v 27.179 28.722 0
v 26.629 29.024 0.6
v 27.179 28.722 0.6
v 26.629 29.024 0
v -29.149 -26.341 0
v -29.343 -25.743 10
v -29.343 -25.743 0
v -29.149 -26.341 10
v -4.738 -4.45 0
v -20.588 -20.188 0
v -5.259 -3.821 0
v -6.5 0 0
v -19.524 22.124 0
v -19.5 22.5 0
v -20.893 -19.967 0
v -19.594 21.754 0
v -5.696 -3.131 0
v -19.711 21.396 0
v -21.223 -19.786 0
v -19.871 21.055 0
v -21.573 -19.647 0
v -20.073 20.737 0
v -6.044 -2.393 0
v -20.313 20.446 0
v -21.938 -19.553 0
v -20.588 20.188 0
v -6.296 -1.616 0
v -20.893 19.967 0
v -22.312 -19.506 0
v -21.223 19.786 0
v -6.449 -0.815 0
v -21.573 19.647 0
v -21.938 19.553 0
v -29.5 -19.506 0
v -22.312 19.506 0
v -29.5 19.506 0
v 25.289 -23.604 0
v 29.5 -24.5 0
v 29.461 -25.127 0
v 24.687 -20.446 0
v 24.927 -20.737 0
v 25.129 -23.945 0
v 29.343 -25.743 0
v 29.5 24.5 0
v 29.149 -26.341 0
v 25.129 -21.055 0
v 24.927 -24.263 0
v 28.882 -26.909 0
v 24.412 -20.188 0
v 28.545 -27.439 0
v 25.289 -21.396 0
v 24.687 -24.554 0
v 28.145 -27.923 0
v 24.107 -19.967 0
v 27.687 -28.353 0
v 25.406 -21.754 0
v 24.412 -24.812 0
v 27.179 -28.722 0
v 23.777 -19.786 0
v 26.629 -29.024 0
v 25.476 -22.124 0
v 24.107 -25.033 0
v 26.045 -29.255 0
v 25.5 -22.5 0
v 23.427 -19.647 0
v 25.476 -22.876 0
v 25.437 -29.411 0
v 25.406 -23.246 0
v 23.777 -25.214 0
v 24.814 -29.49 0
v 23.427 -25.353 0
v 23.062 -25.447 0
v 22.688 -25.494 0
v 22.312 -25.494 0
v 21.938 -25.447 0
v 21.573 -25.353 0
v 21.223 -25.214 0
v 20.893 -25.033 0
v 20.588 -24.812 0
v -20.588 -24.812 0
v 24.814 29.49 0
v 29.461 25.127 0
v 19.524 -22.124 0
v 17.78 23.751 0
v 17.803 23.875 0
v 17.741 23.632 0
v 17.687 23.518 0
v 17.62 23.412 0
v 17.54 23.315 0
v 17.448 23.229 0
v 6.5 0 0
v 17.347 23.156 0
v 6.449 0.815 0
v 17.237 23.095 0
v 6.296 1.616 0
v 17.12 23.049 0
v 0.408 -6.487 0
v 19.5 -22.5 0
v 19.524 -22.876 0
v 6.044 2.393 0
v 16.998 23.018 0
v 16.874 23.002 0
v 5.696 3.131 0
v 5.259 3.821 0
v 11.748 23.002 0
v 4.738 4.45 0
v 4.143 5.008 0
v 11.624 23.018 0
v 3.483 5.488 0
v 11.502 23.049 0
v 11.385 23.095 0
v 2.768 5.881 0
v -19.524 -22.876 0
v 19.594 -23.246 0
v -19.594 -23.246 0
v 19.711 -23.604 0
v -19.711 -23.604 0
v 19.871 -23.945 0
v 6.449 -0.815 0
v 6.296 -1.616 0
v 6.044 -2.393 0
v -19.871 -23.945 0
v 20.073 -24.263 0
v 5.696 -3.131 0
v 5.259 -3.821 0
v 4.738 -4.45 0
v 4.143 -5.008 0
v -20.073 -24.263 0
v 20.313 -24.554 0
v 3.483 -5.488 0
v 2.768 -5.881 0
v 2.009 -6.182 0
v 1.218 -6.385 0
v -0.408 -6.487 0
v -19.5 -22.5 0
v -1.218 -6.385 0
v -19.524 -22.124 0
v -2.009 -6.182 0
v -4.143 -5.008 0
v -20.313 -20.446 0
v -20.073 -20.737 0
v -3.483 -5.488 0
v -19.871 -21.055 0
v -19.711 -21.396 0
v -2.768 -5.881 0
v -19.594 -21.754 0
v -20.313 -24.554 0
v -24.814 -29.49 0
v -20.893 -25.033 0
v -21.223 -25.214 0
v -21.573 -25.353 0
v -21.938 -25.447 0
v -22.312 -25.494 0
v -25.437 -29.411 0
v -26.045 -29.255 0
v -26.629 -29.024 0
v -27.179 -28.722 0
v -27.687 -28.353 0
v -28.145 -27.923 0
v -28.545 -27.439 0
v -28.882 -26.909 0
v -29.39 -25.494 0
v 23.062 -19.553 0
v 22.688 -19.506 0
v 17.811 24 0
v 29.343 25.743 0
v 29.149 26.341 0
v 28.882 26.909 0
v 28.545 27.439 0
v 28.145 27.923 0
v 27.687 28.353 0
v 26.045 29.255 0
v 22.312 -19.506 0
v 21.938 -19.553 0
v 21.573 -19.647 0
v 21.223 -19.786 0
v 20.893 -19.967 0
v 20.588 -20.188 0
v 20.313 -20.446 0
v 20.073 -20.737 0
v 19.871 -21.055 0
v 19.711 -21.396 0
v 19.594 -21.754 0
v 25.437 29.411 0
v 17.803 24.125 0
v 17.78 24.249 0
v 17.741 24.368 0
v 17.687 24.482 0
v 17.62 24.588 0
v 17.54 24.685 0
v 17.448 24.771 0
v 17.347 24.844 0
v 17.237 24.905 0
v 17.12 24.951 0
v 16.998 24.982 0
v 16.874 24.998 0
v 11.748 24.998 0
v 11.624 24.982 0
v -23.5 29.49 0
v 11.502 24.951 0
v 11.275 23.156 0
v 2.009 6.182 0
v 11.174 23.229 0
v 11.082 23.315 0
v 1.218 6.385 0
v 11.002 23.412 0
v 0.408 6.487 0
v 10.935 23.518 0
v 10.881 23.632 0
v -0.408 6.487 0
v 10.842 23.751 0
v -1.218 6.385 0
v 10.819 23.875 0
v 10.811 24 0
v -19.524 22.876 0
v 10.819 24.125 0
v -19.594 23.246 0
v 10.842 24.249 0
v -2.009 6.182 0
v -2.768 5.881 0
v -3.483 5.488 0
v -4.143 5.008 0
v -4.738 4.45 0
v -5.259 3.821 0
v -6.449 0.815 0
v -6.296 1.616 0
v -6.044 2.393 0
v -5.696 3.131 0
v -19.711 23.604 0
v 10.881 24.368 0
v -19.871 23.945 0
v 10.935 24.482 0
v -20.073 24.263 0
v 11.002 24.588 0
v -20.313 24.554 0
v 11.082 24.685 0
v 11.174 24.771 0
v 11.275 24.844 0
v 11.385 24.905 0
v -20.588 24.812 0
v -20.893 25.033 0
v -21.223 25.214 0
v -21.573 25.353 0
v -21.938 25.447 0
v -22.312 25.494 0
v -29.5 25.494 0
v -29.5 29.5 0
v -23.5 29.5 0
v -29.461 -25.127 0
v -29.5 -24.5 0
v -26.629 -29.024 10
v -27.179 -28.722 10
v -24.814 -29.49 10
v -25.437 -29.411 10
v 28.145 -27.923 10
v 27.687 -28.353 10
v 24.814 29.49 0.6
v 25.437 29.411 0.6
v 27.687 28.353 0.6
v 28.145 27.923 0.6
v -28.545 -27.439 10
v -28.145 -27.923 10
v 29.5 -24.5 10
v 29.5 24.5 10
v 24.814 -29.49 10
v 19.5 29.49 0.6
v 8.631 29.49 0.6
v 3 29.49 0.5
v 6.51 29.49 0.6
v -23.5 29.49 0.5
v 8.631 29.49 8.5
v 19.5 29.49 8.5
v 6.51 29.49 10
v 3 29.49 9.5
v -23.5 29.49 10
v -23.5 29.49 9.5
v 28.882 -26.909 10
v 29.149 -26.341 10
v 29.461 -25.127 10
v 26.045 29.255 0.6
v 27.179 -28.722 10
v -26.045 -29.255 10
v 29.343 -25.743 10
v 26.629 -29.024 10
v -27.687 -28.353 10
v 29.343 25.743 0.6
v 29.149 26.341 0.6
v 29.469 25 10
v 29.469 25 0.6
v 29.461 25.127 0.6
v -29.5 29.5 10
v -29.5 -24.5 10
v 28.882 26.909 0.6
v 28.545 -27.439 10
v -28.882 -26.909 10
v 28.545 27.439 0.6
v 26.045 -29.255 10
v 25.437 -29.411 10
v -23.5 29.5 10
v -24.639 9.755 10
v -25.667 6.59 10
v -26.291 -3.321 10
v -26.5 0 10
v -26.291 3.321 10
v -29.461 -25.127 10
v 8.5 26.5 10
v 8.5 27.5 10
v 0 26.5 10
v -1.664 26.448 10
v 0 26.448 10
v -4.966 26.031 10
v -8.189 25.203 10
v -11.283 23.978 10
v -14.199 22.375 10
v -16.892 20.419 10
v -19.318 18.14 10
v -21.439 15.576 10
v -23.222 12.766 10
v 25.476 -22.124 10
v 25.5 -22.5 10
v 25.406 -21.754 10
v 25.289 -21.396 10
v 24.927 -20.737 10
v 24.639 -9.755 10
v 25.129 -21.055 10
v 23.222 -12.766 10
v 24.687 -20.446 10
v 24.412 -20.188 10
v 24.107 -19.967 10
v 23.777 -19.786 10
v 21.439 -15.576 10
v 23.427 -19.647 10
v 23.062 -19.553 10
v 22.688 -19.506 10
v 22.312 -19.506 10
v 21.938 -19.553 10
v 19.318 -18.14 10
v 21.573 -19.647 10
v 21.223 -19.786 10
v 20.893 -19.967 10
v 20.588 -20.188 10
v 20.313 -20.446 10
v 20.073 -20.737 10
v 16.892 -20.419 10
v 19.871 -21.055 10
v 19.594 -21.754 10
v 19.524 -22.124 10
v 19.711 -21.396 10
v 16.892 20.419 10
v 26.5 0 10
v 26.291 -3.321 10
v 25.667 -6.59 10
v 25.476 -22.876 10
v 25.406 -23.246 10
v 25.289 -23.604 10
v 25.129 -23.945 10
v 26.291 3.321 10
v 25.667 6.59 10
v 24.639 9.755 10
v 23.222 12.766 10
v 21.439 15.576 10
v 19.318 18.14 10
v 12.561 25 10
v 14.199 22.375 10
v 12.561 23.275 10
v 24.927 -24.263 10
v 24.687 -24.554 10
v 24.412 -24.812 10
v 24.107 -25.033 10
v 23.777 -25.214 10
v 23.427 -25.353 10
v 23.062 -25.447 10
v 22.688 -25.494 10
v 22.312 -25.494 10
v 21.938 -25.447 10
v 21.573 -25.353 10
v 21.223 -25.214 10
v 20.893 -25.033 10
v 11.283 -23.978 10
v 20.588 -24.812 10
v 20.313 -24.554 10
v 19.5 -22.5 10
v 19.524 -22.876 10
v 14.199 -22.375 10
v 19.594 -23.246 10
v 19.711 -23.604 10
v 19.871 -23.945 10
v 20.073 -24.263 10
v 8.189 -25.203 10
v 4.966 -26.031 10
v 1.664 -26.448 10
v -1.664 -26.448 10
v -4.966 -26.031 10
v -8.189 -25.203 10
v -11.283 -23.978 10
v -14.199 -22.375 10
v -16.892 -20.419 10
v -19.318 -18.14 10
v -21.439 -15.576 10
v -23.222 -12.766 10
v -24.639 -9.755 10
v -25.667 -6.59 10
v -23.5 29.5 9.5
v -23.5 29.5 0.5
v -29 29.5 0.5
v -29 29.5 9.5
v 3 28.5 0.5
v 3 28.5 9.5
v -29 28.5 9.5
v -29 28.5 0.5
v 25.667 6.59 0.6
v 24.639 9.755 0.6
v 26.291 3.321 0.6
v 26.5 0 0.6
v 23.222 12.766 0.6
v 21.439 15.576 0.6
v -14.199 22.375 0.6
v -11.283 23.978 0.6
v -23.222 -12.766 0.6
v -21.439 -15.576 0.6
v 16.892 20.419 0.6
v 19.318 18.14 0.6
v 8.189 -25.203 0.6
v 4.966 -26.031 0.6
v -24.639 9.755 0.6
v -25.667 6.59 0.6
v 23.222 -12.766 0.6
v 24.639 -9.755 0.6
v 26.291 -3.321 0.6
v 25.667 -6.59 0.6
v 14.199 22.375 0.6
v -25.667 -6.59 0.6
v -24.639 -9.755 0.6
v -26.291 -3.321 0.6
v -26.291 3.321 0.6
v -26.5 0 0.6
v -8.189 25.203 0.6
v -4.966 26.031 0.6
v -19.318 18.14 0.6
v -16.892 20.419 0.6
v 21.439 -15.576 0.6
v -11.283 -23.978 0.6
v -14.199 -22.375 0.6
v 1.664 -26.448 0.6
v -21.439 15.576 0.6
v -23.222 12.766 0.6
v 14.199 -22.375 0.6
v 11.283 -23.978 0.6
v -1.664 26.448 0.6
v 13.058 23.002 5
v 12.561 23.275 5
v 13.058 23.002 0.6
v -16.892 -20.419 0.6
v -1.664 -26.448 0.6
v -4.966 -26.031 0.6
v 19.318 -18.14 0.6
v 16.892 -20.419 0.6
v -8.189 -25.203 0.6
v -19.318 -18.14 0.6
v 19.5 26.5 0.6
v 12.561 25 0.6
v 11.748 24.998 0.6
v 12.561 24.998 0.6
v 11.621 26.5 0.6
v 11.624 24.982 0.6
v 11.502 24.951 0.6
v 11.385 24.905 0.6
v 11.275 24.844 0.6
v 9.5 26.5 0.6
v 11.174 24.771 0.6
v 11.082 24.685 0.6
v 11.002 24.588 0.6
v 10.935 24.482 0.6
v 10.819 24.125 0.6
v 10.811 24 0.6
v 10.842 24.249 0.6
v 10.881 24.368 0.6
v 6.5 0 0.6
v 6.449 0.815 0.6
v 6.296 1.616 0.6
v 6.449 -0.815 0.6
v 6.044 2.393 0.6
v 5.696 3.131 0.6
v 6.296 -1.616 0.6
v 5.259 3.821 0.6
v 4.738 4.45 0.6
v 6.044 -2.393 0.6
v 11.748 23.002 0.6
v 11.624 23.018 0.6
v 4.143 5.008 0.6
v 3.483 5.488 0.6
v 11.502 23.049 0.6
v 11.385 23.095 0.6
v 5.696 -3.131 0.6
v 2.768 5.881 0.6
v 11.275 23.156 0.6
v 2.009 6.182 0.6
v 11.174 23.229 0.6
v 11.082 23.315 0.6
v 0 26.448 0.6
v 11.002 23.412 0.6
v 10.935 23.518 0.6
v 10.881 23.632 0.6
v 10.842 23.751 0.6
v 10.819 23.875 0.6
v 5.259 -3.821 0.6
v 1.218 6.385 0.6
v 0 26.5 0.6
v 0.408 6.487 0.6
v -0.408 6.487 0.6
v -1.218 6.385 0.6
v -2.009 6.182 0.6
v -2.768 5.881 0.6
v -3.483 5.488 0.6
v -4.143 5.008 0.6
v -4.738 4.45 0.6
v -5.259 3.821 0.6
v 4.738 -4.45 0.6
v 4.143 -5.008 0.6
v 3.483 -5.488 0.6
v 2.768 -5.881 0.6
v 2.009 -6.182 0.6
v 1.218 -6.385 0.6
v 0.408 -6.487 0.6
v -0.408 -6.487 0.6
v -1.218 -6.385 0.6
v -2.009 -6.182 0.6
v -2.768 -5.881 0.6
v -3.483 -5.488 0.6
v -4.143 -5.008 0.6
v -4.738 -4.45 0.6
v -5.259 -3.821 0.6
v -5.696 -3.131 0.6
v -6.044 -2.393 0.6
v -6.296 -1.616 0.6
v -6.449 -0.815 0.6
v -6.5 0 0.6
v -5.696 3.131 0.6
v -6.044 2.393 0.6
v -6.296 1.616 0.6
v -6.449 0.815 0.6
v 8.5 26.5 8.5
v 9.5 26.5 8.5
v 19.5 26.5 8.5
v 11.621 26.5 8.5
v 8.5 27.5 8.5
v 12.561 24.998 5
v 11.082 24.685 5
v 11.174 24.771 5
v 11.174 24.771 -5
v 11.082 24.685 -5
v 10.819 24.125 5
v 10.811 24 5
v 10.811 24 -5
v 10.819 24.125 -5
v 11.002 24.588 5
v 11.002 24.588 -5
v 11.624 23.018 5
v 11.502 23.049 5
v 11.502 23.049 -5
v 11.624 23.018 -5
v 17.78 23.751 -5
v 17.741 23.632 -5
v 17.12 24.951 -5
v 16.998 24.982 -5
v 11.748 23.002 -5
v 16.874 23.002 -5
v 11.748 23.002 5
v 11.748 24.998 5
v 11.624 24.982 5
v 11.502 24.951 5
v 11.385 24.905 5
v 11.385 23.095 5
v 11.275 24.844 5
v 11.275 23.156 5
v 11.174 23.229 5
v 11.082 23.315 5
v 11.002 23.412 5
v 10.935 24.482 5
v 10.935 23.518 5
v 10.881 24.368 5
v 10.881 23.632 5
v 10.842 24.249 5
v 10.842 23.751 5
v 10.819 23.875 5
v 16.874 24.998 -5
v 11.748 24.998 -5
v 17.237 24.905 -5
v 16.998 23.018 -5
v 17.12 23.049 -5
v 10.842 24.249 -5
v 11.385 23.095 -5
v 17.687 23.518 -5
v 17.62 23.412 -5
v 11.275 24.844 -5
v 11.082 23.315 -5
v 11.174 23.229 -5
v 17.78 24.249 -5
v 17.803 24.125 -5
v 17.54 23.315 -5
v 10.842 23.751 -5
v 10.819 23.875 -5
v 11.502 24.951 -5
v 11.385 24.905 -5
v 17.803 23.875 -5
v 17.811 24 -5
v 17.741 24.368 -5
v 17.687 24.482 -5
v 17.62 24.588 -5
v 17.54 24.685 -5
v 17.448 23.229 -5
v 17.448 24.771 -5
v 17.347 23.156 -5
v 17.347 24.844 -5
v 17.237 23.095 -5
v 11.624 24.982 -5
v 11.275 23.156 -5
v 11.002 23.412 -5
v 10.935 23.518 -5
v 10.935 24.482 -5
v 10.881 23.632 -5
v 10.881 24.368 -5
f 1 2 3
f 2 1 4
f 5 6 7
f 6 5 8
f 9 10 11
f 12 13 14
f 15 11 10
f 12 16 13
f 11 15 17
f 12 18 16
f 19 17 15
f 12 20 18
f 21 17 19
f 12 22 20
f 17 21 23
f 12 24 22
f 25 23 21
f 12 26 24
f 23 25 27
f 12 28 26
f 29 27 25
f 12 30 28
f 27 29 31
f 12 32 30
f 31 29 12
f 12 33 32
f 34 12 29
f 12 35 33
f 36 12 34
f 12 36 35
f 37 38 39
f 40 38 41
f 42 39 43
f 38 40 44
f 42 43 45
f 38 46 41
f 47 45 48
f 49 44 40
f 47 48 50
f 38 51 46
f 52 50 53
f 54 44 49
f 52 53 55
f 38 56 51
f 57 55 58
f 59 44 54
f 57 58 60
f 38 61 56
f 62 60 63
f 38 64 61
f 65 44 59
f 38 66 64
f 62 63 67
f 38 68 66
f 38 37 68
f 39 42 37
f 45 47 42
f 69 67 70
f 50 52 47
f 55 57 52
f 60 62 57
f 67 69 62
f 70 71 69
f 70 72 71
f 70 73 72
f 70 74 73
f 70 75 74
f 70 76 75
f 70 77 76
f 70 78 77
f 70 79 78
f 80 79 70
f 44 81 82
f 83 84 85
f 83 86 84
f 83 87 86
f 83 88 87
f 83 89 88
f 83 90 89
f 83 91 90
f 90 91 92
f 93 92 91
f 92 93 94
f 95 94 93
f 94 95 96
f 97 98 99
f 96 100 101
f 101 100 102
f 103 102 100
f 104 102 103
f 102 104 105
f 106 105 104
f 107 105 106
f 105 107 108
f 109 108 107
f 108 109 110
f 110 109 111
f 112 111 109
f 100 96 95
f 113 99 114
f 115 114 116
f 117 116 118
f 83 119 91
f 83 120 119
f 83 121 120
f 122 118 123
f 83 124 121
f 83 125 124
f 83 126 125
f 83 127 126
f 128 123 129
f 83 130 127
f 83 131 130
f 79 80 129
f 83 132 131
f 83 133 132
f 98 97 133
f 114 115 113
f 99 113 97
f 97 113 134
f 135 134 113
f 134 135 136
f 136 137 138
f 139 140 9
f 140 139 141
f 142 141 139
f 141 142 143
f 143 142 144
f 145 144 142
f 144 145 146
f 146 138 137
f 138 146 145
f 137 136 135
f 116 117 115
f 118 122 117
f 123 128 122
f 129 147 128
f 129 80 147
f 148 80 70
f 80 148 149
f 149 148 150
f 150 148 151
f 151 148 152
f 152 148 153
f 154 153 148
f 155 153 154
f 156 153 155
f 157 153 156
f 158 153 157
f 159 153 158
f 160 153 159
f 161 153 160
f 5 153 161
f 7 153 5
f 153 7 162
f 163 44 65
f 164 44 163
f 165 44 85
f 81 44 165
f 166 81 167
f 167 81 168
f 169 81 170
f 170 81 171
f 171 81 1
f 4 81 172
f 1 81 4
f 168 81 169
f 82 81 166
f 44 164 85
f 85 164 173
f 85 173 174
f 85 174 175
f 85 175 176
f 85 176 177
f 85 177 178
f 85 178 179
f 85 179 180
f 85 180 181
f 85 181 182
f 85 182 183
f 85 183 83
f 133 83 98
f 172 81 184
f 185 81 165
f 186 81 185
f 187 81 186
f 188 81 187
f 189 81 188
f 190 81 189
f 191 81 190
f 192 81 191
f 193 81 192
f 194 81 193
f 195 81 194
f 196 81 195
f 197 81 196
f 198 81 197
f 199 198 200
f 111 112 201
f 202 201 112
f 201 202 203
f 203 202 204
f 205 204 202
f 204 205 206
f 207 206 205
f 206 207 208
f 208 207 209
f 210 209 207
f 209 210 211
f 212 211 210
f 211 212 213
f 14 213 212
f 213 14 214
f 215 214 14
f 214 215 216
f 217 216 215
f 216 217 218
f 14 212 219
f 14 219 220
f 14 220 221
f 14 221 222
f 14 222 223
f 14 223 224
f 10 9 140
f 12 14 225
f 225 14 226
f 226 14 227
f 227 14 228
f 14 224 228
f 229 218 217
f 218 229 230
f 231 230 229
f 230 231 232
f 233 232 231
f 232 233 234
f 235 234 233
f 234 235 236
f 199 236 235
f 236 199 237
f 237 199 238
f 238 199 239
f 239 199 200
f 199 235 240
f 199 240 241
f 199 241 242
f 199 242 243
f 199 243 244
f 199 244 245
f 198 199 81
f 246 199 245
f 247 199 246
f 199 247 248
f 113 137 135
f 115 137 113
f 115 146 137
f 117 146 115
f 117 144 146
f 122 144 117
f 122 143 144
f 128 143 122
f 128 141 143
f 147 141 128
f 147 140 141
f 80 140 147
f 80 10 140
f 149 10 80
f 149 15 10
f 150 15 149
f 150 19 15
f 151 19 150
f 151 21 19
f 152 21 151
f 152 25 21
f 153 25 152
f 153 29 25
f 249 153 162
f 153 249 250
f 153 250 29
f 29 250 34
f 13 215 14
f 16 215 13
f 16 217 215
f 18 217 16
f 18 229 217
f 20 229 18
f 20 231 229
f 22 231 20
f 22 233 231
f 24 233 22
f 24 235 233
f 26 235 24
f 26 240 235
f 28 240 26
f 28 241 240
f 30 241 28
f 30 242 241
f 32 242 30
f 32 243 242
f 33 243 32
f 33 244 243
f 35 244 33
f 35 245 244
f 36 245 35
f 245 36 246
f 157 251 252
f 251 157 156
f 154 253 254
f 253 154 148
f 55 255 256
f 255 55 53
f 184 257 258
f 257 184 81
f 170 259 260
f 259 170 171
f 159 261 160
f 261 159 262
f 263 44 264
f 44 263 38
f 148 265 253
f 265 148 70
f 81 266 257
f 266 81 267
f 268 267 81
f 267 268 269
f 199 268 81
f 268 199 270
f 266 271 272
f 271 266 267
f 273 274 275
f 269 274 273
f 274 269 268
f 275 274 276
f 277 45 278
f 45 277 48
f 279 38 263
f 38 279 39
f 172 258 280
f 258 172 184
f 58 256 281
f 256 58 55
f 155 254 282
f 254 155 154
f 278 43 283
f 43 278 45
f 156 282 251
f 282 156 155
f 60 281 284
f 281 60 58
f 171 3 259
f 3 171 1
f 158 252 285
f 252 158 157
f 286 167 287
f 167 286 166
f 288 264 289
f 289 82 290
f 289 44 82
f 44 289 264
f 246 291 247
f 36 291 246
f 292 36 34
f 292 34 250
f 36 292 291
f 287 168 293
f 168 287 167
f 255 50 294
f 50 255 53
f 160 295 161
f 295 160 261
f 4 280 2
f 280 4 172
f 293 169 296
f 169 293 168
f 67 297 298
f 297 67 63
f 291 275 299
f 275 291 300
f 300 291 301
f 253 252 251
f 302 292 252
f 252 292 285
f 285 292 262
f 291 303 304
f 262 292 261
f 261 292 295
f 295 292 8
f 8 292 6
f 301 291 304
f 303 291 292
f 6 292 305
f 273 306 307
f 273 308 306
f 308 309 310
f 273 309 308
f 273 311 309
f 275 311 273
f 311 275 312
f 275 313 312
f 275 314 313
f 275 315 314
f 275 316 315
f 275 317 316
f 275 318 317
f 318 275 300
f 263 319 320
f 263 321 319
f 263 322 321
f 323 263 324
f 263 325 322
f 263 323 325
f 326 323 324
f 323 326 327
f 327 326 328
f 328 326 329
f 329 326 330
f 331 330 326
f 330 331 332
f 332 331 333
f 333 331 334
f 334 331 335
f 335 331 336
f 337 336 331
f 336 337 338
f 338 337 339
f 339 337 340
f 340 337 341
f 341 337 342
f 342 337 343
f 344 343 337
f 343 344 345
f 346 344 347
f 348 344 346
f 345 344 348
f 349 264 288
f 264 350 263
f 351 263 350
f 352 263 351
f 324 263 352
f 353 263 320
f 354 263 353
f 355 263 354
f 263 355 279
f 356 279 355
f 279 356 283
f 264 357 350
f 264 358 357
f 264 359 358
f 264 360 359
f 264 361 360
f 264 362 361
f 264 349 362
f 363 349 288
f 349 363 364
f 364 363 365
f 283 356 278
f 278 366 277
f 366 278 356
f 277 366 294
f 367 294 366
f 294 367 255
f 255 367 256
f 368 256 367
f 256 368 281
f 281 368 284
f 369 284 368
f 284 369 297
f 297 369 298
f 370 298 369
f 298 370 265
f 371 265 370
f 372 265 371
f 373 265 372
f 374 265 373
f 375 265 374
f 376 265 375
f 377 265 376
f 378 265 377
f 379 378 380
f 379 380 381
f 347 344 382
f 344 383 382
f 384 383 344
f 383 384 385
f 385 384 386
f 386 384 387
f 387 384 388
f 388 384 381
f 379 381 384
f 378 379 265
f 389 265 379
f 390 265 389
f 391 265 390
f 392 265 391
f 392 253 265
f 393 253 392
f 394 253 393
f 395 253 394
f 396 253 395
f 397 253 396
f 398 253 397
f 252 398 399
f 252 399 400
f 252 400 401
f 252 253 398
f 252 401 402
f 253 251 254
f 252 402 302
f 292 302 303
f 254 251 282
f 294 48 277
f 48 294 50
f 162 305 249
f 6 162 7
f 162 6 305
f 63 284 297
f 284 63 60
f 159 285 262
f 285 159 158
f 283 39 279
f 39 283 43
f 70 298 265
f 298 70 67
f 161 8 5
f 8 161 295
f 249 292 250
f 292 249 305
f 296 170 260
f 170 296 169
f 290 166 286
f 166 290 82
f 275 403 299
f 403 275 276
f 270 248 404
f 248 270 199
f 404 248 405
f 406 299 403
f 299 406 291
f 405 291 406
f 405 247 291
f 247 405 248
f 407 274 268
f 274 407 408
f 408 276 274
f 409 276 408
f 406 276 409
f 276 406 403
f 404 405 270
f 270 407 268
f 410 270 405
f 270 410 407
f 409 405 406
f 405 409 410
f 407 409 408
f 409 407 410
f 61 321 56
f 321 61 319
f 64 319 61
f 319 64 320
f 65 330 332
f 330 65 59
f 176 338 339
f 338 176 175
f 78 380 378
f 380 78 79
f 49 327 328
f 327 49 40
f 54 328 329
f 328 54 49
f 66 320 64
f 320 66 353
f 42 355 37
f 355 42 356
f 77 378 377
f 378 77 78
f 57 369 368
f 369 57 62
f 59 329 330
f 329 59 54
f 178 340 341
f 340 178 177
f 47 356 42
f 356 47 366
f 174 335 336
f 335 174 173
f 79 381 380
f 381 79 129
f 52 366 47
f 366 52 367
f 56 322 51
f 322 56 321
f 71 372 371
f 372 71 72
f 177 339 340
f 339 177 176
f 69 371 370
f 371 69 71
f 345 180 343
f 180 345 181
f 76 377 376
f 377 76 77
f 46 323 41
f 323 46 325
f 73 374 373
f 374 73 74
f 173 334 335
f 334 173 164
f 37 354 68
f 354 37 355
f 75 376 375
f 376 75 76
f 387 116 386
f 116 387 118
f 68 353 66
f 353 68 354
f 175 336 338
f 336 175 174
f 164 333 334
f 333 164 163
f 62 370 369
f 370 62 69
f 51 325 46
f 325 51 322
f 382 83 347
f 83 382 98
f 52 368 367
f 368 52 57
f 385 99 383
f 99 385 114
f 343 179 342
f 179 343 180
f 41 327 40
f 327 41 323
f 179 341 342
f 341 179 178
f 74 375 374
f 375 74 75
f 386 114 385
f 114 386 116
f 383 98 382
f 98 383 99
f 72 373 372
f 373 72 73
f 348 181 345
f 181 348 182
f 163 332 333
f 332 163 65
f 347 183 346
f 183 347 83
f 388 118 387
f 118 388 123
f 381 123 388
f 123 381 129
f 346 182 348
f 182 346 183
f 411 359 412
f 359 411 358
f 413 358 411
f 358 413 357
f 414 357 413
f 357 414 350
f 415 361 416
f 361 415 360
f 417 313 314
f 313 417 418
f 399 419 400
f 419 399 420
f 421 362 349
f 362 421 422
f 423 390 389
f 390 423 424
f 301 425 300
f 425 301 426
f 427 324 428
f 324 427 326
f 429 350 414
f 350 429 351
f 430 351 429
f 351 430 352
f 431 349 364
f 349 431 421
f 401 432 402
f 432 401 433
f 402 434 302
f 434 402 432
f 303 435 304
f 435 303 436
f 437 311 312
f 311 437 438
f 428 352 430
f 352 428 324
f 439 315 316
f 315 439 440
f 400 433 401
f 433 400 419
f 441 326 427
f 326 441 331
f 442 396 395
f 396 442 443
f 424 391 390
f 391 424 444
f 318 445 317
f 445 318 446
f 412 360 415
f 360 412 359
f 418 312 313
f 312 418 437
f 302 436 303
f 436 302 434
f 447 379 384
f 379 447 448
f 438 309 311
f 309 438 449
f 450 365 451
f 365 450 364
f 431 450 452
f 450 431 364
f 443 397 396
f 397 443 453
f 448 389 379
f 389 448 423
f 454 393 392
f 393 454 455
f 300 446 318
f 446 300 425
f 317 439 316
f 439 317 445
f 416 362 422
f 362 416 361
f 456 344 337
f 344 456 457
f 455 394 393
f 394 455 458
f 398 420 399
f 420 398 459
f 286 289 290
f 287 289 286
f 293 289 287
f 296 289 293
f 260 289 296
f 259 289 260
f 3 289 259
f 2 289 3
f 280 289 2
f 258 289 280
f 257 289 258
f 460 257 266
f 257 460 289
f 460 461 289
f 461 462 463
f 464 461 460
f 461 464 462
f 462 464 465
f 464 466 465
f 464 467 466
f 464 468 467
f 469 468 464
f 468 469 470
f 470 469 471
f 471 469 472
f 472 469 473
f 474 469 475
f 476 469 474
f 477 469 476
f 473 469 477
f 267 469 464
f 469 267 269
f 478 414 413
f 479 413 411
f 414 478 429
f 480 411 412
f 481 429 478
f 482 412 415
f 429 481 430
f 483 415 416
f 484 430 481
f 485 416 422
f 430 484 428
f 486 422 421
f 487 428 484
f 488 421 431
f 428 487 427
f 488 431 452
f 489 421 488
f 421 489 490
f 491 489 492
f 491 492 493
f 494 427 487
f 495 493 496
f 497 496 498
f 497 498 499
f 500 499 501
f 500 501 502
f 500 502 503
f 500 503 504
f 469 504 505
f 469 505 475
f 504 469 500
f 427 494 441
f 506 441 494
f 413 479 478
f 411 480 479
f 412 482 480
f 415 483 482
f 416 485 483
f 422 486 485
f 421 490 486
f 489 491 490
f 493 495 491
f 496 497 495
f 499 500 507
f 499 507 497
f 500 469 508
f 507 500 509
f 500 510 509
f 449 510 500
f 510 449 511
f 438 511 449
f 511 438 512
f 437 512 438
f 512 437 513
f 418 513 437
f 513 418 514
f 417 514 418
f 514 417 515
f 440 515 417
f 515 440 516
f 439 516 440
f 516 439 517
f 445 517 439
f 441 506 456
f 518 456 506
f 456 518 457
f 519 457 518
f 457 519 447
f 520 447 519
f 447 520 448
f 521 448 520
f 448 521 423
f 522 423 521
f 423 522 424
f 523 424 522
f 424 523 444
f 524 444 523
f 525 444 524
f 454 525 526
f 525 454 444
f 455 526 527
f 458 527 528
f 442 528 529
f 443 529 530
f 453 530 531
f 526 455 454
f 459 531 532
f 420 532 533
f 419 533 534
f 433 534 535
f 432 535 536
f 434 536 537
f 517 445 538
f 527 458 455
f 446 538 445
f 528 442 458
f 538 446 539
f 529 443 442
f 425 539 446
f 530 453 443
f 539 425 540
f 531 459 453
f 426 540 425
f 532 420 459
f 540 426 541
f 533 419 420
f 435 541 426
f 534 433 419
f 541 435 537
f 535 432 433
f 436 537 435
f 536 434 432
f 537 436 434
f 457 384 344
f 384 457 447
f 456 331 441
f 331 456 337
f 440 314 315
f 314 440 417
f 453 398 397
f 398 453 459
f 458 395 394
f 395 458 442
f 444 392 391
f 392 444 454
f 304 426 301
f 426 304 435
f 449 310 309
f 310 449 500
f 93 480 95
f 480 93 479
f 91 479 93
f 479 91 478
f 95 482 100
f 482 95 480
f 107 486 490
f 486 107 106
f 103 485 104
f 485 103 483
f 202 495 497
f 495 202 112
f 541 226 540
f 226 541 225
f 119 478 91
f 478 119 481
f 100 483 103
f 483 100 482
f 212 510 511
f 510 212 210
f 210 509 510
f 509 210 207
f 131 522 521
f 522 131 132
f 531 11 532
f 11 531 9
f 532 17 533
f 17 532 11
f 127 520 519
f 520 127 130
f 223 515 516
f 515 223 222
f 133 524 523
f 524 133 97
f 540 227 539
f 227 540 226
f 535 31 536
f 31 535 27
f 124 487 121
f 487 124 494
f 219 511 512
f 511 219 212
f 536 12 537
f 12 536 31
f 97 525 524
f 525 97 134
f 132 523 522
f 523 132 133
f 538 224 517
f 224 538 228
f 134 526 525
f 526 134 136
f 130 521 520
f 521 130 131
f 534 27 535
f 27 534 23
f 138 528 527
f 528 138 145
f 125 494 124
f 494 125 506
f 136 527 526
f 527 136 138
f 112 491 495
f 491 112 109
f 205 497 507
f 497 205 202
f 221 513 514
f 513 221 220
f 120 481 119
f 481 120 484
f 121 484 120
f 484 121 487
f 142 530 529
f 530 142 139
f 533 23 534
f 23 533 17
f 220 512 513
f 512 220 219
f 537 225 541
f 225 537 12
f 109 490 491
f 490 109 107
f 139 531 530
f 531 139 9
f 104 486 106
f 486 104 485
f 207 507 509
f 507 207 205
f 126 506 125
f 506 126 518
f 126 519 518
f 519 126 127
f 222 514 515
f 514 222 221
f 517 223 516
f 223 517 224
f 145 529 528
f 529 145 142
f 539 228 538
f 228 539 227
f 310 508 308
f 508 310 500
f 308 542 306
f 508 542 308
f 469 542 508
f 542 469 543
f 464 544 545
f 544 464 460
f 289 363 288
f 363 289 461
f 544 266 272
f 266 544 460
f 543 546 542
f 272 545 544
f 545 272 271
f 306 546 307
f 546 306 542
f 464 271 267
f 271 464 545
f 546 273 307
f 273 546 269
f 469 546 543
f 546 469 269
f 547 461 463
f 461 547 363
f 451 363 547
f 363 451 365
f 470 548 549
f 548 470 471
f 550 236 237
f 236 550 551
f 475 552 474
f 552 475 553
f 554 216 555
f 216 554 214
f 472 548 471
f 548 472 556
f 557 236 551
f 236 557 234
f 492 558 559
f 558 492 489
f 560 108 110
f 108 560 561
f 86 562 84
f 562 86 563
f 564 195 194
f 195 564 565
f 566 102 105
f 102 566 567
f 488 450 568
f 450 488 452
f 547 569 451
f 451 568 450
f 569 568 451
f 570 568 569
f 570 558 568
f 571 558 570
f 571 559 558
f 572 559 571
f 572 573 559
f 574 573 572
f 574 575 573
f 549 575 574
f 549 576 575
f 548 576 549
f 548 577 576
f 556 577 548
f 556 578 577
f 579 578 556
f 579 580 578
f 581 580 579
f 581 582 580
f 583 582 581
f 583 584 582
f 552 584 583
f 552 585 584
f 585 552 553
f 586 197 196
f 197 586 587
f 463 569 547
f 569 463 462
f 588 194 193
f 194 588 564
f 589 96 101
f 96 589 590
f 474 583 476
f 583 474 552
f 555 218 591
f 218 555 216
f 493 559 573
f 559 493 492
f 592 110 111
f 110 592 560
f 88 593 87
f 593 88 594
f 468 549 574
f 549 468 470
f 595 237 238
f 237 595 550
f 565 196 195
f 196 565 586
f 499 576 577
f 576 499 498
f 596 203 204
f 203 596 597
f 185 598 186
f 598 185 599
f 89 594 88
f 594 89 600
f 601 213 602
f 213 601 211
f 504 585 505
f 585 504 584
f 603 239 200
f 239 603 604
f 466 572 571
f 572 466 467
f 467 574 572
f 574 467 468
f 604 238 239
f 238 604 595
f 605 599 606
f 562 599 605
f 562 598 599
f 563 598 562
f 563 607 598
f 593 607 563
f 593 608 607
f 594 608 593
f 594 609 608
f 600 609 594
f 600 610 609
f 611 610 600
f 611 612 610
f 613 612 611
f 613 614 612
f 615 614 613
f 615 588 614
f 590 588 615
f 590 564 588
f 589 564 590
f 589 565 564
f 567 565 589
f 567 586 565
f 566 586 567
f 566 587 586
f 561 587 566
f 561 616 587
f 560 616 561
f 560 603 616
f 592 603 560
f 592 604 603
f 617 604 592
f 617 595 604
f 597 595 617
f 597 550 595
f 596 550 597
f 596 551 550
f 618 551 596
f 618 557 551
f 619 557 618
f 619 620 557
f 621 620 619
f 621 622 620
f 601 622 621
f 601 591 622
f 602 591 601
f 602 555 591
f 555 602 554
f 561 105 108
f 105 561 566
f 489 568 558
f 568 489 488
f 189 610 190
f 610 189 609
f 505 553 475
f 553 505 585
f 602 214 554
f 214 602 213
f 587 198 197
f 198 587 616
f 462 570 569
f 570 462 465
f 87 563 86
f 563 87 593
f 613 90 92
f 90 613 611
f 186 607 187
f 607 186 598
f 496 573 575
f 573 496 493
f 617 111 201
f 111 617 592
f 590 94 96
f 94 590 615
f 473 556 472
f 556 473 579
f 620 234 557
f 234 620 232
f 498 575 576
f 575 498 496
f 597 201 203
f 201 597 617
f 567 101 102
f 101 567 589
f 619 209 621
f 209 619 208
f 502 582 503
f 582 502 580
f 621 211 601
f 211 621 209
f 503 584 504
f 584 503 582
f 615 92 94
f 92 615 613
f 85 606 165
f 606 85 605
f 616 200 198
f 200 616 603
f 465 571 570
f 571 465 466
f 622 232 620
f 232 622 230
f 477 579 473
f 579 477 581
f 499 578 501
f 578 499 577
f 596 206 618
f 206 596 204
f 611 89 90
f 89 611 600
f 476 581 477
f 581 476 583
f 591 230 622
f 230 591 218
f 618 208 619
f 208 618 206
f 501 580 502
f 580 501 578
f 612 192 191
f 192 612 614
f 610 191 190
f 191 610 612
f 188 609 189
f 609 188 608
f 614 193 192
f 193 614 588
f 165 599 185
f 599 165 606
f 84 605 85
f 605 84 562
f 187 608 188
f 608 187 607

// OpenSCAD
$fn = 50;


union() {
	difference() {
		union() {
			hull() {
				translate(v = [-24.5000000000, 24.5000000000, 0]) {
					cylinder(h = 10, r = 5);
				}
				translate(v = [24.5000000000, 24.5000000000, 0]) {
					cylinder(h = 10, r = 5);
				}
				translate(v = [-24.5000000000, -24.5000000000, 0]) {
					cylinder(h = 10, r = 5);
				}
				translate(v = [24.5000000000, -24.5000000000, 0]) {
					cylinder(h = 10, r = 5);
				}
			}
			translate(v = [-29.5000000000, 23.5000000000, 0]) {
				cube(size = [6, 6, 10]);
			}
		}
		union() {
			translate(v = [-30.0000000000, -22.5000000000, -250.0000000000]) {
				rotate(a = [0, 0, 0]) {
					difference() {
						union() {
							hull() {
								translate(v = [7.5000000000, 0, 0]) {
									cylinder(h = 250, r = 3.0000000000, r1 = 3.0000000000, r2 = 3.0000000000);
								}
								translate(v = [-7.5000000000, 0, 0]) {
									cylinder(h = 250, r = 3.0000000000, r1 = 3.0000000000, r2 = 3.0000000000);
								}
							}
						}
						union();
					}
				}
			}
			translate(v = [-30.0000000000, 22.5000000000, -250.0000000000]) {
				rotate(a = [0, 0, 0]) {
					difference() {
						union() {
							hull() {
								translate(v = [7.5000000000, 0, 0]) {
									cylinder(h = 250, r = 3.0000000000, r1 = 3.0000000000, r2 = 3.0000000000);
								}
								translate(v = [-7.5000000000, 0, 0]) {
									cylinder(h = 250, r = 3.0000000000, r1 = 3.0000000000, r2 = 3.0000000000);
								}
							}
						}
						union();
					}
				}
			}
			translate(v = [-29.0000000000, 28.5000000000, 0.5000000000]) {
				cube(size = [32, 1, 9.0000000000]);
			}
			translate(v = [22.5000000000, -22.5000000000, 0]) {
				cylinder(h = 100, r = 3.0000000000);
			}
			translate(v = [0, 0, 0.6000000000]) {
				cylinder(h = 12.4000000000, r = 26.5000000000);
			}
			translate(v = [0, 0, -5.0000000000]) {
				cylinder(h = 10, r = 6.5000000000);
			}
			translate(v = [0.0000000000, 25.0000000000, 0.6000000000]) {
				cube(size = [29.5000000000, 1.5000000000, 12.4000000000]);
			}
			translate(v = [19.5000000000, 25.0000000000, 0.6000000000]) {
				cube(size = [10, 4.5000000000, 12.4000000000]);
			}
			translate(v = [8.5000000000, 25.0000000000, 8.5000000000]) {
				cube(size = [21, 4.5000000000, 1.5000000000]);
			}
			translate(v = [5.7500000000, 30.2500000000, 0.6000000000]) {
				rotate(a = [0, 0, -45]) {
					cube(size = [7.5000000000, 1.5000000000, 12.4000000000]);
				}
			}
			translate(v = [5.0610000000, 23.0000000000, 0.6000000000]) {
				cube(size = [7.5000000000, 2, 9.4000000000]);
			}
		}
	}
	union() {
		translate(v = [14.3110000000, 24.0000000000, -5.0000000000]) {
			rotate(a = [0, 0, 0]) {
				difference() {
					union() {
						#hull() {
							#translate(v = [2.5000000000, 0, 0]) {
								cylinder(h = 10, r = 1.0000000000, r1 = 1.0000000000, r2 = 1.0000000000);
							}
							#translate(v = [-2.5000000000, 0, 0]) {
								cylinder(h = 10, r = 1.0000000000, r1 = 1.0000000000, r2 = 1.0000000000);
							}
						}
					}
					union();
				}
			}
		}
	}
}
